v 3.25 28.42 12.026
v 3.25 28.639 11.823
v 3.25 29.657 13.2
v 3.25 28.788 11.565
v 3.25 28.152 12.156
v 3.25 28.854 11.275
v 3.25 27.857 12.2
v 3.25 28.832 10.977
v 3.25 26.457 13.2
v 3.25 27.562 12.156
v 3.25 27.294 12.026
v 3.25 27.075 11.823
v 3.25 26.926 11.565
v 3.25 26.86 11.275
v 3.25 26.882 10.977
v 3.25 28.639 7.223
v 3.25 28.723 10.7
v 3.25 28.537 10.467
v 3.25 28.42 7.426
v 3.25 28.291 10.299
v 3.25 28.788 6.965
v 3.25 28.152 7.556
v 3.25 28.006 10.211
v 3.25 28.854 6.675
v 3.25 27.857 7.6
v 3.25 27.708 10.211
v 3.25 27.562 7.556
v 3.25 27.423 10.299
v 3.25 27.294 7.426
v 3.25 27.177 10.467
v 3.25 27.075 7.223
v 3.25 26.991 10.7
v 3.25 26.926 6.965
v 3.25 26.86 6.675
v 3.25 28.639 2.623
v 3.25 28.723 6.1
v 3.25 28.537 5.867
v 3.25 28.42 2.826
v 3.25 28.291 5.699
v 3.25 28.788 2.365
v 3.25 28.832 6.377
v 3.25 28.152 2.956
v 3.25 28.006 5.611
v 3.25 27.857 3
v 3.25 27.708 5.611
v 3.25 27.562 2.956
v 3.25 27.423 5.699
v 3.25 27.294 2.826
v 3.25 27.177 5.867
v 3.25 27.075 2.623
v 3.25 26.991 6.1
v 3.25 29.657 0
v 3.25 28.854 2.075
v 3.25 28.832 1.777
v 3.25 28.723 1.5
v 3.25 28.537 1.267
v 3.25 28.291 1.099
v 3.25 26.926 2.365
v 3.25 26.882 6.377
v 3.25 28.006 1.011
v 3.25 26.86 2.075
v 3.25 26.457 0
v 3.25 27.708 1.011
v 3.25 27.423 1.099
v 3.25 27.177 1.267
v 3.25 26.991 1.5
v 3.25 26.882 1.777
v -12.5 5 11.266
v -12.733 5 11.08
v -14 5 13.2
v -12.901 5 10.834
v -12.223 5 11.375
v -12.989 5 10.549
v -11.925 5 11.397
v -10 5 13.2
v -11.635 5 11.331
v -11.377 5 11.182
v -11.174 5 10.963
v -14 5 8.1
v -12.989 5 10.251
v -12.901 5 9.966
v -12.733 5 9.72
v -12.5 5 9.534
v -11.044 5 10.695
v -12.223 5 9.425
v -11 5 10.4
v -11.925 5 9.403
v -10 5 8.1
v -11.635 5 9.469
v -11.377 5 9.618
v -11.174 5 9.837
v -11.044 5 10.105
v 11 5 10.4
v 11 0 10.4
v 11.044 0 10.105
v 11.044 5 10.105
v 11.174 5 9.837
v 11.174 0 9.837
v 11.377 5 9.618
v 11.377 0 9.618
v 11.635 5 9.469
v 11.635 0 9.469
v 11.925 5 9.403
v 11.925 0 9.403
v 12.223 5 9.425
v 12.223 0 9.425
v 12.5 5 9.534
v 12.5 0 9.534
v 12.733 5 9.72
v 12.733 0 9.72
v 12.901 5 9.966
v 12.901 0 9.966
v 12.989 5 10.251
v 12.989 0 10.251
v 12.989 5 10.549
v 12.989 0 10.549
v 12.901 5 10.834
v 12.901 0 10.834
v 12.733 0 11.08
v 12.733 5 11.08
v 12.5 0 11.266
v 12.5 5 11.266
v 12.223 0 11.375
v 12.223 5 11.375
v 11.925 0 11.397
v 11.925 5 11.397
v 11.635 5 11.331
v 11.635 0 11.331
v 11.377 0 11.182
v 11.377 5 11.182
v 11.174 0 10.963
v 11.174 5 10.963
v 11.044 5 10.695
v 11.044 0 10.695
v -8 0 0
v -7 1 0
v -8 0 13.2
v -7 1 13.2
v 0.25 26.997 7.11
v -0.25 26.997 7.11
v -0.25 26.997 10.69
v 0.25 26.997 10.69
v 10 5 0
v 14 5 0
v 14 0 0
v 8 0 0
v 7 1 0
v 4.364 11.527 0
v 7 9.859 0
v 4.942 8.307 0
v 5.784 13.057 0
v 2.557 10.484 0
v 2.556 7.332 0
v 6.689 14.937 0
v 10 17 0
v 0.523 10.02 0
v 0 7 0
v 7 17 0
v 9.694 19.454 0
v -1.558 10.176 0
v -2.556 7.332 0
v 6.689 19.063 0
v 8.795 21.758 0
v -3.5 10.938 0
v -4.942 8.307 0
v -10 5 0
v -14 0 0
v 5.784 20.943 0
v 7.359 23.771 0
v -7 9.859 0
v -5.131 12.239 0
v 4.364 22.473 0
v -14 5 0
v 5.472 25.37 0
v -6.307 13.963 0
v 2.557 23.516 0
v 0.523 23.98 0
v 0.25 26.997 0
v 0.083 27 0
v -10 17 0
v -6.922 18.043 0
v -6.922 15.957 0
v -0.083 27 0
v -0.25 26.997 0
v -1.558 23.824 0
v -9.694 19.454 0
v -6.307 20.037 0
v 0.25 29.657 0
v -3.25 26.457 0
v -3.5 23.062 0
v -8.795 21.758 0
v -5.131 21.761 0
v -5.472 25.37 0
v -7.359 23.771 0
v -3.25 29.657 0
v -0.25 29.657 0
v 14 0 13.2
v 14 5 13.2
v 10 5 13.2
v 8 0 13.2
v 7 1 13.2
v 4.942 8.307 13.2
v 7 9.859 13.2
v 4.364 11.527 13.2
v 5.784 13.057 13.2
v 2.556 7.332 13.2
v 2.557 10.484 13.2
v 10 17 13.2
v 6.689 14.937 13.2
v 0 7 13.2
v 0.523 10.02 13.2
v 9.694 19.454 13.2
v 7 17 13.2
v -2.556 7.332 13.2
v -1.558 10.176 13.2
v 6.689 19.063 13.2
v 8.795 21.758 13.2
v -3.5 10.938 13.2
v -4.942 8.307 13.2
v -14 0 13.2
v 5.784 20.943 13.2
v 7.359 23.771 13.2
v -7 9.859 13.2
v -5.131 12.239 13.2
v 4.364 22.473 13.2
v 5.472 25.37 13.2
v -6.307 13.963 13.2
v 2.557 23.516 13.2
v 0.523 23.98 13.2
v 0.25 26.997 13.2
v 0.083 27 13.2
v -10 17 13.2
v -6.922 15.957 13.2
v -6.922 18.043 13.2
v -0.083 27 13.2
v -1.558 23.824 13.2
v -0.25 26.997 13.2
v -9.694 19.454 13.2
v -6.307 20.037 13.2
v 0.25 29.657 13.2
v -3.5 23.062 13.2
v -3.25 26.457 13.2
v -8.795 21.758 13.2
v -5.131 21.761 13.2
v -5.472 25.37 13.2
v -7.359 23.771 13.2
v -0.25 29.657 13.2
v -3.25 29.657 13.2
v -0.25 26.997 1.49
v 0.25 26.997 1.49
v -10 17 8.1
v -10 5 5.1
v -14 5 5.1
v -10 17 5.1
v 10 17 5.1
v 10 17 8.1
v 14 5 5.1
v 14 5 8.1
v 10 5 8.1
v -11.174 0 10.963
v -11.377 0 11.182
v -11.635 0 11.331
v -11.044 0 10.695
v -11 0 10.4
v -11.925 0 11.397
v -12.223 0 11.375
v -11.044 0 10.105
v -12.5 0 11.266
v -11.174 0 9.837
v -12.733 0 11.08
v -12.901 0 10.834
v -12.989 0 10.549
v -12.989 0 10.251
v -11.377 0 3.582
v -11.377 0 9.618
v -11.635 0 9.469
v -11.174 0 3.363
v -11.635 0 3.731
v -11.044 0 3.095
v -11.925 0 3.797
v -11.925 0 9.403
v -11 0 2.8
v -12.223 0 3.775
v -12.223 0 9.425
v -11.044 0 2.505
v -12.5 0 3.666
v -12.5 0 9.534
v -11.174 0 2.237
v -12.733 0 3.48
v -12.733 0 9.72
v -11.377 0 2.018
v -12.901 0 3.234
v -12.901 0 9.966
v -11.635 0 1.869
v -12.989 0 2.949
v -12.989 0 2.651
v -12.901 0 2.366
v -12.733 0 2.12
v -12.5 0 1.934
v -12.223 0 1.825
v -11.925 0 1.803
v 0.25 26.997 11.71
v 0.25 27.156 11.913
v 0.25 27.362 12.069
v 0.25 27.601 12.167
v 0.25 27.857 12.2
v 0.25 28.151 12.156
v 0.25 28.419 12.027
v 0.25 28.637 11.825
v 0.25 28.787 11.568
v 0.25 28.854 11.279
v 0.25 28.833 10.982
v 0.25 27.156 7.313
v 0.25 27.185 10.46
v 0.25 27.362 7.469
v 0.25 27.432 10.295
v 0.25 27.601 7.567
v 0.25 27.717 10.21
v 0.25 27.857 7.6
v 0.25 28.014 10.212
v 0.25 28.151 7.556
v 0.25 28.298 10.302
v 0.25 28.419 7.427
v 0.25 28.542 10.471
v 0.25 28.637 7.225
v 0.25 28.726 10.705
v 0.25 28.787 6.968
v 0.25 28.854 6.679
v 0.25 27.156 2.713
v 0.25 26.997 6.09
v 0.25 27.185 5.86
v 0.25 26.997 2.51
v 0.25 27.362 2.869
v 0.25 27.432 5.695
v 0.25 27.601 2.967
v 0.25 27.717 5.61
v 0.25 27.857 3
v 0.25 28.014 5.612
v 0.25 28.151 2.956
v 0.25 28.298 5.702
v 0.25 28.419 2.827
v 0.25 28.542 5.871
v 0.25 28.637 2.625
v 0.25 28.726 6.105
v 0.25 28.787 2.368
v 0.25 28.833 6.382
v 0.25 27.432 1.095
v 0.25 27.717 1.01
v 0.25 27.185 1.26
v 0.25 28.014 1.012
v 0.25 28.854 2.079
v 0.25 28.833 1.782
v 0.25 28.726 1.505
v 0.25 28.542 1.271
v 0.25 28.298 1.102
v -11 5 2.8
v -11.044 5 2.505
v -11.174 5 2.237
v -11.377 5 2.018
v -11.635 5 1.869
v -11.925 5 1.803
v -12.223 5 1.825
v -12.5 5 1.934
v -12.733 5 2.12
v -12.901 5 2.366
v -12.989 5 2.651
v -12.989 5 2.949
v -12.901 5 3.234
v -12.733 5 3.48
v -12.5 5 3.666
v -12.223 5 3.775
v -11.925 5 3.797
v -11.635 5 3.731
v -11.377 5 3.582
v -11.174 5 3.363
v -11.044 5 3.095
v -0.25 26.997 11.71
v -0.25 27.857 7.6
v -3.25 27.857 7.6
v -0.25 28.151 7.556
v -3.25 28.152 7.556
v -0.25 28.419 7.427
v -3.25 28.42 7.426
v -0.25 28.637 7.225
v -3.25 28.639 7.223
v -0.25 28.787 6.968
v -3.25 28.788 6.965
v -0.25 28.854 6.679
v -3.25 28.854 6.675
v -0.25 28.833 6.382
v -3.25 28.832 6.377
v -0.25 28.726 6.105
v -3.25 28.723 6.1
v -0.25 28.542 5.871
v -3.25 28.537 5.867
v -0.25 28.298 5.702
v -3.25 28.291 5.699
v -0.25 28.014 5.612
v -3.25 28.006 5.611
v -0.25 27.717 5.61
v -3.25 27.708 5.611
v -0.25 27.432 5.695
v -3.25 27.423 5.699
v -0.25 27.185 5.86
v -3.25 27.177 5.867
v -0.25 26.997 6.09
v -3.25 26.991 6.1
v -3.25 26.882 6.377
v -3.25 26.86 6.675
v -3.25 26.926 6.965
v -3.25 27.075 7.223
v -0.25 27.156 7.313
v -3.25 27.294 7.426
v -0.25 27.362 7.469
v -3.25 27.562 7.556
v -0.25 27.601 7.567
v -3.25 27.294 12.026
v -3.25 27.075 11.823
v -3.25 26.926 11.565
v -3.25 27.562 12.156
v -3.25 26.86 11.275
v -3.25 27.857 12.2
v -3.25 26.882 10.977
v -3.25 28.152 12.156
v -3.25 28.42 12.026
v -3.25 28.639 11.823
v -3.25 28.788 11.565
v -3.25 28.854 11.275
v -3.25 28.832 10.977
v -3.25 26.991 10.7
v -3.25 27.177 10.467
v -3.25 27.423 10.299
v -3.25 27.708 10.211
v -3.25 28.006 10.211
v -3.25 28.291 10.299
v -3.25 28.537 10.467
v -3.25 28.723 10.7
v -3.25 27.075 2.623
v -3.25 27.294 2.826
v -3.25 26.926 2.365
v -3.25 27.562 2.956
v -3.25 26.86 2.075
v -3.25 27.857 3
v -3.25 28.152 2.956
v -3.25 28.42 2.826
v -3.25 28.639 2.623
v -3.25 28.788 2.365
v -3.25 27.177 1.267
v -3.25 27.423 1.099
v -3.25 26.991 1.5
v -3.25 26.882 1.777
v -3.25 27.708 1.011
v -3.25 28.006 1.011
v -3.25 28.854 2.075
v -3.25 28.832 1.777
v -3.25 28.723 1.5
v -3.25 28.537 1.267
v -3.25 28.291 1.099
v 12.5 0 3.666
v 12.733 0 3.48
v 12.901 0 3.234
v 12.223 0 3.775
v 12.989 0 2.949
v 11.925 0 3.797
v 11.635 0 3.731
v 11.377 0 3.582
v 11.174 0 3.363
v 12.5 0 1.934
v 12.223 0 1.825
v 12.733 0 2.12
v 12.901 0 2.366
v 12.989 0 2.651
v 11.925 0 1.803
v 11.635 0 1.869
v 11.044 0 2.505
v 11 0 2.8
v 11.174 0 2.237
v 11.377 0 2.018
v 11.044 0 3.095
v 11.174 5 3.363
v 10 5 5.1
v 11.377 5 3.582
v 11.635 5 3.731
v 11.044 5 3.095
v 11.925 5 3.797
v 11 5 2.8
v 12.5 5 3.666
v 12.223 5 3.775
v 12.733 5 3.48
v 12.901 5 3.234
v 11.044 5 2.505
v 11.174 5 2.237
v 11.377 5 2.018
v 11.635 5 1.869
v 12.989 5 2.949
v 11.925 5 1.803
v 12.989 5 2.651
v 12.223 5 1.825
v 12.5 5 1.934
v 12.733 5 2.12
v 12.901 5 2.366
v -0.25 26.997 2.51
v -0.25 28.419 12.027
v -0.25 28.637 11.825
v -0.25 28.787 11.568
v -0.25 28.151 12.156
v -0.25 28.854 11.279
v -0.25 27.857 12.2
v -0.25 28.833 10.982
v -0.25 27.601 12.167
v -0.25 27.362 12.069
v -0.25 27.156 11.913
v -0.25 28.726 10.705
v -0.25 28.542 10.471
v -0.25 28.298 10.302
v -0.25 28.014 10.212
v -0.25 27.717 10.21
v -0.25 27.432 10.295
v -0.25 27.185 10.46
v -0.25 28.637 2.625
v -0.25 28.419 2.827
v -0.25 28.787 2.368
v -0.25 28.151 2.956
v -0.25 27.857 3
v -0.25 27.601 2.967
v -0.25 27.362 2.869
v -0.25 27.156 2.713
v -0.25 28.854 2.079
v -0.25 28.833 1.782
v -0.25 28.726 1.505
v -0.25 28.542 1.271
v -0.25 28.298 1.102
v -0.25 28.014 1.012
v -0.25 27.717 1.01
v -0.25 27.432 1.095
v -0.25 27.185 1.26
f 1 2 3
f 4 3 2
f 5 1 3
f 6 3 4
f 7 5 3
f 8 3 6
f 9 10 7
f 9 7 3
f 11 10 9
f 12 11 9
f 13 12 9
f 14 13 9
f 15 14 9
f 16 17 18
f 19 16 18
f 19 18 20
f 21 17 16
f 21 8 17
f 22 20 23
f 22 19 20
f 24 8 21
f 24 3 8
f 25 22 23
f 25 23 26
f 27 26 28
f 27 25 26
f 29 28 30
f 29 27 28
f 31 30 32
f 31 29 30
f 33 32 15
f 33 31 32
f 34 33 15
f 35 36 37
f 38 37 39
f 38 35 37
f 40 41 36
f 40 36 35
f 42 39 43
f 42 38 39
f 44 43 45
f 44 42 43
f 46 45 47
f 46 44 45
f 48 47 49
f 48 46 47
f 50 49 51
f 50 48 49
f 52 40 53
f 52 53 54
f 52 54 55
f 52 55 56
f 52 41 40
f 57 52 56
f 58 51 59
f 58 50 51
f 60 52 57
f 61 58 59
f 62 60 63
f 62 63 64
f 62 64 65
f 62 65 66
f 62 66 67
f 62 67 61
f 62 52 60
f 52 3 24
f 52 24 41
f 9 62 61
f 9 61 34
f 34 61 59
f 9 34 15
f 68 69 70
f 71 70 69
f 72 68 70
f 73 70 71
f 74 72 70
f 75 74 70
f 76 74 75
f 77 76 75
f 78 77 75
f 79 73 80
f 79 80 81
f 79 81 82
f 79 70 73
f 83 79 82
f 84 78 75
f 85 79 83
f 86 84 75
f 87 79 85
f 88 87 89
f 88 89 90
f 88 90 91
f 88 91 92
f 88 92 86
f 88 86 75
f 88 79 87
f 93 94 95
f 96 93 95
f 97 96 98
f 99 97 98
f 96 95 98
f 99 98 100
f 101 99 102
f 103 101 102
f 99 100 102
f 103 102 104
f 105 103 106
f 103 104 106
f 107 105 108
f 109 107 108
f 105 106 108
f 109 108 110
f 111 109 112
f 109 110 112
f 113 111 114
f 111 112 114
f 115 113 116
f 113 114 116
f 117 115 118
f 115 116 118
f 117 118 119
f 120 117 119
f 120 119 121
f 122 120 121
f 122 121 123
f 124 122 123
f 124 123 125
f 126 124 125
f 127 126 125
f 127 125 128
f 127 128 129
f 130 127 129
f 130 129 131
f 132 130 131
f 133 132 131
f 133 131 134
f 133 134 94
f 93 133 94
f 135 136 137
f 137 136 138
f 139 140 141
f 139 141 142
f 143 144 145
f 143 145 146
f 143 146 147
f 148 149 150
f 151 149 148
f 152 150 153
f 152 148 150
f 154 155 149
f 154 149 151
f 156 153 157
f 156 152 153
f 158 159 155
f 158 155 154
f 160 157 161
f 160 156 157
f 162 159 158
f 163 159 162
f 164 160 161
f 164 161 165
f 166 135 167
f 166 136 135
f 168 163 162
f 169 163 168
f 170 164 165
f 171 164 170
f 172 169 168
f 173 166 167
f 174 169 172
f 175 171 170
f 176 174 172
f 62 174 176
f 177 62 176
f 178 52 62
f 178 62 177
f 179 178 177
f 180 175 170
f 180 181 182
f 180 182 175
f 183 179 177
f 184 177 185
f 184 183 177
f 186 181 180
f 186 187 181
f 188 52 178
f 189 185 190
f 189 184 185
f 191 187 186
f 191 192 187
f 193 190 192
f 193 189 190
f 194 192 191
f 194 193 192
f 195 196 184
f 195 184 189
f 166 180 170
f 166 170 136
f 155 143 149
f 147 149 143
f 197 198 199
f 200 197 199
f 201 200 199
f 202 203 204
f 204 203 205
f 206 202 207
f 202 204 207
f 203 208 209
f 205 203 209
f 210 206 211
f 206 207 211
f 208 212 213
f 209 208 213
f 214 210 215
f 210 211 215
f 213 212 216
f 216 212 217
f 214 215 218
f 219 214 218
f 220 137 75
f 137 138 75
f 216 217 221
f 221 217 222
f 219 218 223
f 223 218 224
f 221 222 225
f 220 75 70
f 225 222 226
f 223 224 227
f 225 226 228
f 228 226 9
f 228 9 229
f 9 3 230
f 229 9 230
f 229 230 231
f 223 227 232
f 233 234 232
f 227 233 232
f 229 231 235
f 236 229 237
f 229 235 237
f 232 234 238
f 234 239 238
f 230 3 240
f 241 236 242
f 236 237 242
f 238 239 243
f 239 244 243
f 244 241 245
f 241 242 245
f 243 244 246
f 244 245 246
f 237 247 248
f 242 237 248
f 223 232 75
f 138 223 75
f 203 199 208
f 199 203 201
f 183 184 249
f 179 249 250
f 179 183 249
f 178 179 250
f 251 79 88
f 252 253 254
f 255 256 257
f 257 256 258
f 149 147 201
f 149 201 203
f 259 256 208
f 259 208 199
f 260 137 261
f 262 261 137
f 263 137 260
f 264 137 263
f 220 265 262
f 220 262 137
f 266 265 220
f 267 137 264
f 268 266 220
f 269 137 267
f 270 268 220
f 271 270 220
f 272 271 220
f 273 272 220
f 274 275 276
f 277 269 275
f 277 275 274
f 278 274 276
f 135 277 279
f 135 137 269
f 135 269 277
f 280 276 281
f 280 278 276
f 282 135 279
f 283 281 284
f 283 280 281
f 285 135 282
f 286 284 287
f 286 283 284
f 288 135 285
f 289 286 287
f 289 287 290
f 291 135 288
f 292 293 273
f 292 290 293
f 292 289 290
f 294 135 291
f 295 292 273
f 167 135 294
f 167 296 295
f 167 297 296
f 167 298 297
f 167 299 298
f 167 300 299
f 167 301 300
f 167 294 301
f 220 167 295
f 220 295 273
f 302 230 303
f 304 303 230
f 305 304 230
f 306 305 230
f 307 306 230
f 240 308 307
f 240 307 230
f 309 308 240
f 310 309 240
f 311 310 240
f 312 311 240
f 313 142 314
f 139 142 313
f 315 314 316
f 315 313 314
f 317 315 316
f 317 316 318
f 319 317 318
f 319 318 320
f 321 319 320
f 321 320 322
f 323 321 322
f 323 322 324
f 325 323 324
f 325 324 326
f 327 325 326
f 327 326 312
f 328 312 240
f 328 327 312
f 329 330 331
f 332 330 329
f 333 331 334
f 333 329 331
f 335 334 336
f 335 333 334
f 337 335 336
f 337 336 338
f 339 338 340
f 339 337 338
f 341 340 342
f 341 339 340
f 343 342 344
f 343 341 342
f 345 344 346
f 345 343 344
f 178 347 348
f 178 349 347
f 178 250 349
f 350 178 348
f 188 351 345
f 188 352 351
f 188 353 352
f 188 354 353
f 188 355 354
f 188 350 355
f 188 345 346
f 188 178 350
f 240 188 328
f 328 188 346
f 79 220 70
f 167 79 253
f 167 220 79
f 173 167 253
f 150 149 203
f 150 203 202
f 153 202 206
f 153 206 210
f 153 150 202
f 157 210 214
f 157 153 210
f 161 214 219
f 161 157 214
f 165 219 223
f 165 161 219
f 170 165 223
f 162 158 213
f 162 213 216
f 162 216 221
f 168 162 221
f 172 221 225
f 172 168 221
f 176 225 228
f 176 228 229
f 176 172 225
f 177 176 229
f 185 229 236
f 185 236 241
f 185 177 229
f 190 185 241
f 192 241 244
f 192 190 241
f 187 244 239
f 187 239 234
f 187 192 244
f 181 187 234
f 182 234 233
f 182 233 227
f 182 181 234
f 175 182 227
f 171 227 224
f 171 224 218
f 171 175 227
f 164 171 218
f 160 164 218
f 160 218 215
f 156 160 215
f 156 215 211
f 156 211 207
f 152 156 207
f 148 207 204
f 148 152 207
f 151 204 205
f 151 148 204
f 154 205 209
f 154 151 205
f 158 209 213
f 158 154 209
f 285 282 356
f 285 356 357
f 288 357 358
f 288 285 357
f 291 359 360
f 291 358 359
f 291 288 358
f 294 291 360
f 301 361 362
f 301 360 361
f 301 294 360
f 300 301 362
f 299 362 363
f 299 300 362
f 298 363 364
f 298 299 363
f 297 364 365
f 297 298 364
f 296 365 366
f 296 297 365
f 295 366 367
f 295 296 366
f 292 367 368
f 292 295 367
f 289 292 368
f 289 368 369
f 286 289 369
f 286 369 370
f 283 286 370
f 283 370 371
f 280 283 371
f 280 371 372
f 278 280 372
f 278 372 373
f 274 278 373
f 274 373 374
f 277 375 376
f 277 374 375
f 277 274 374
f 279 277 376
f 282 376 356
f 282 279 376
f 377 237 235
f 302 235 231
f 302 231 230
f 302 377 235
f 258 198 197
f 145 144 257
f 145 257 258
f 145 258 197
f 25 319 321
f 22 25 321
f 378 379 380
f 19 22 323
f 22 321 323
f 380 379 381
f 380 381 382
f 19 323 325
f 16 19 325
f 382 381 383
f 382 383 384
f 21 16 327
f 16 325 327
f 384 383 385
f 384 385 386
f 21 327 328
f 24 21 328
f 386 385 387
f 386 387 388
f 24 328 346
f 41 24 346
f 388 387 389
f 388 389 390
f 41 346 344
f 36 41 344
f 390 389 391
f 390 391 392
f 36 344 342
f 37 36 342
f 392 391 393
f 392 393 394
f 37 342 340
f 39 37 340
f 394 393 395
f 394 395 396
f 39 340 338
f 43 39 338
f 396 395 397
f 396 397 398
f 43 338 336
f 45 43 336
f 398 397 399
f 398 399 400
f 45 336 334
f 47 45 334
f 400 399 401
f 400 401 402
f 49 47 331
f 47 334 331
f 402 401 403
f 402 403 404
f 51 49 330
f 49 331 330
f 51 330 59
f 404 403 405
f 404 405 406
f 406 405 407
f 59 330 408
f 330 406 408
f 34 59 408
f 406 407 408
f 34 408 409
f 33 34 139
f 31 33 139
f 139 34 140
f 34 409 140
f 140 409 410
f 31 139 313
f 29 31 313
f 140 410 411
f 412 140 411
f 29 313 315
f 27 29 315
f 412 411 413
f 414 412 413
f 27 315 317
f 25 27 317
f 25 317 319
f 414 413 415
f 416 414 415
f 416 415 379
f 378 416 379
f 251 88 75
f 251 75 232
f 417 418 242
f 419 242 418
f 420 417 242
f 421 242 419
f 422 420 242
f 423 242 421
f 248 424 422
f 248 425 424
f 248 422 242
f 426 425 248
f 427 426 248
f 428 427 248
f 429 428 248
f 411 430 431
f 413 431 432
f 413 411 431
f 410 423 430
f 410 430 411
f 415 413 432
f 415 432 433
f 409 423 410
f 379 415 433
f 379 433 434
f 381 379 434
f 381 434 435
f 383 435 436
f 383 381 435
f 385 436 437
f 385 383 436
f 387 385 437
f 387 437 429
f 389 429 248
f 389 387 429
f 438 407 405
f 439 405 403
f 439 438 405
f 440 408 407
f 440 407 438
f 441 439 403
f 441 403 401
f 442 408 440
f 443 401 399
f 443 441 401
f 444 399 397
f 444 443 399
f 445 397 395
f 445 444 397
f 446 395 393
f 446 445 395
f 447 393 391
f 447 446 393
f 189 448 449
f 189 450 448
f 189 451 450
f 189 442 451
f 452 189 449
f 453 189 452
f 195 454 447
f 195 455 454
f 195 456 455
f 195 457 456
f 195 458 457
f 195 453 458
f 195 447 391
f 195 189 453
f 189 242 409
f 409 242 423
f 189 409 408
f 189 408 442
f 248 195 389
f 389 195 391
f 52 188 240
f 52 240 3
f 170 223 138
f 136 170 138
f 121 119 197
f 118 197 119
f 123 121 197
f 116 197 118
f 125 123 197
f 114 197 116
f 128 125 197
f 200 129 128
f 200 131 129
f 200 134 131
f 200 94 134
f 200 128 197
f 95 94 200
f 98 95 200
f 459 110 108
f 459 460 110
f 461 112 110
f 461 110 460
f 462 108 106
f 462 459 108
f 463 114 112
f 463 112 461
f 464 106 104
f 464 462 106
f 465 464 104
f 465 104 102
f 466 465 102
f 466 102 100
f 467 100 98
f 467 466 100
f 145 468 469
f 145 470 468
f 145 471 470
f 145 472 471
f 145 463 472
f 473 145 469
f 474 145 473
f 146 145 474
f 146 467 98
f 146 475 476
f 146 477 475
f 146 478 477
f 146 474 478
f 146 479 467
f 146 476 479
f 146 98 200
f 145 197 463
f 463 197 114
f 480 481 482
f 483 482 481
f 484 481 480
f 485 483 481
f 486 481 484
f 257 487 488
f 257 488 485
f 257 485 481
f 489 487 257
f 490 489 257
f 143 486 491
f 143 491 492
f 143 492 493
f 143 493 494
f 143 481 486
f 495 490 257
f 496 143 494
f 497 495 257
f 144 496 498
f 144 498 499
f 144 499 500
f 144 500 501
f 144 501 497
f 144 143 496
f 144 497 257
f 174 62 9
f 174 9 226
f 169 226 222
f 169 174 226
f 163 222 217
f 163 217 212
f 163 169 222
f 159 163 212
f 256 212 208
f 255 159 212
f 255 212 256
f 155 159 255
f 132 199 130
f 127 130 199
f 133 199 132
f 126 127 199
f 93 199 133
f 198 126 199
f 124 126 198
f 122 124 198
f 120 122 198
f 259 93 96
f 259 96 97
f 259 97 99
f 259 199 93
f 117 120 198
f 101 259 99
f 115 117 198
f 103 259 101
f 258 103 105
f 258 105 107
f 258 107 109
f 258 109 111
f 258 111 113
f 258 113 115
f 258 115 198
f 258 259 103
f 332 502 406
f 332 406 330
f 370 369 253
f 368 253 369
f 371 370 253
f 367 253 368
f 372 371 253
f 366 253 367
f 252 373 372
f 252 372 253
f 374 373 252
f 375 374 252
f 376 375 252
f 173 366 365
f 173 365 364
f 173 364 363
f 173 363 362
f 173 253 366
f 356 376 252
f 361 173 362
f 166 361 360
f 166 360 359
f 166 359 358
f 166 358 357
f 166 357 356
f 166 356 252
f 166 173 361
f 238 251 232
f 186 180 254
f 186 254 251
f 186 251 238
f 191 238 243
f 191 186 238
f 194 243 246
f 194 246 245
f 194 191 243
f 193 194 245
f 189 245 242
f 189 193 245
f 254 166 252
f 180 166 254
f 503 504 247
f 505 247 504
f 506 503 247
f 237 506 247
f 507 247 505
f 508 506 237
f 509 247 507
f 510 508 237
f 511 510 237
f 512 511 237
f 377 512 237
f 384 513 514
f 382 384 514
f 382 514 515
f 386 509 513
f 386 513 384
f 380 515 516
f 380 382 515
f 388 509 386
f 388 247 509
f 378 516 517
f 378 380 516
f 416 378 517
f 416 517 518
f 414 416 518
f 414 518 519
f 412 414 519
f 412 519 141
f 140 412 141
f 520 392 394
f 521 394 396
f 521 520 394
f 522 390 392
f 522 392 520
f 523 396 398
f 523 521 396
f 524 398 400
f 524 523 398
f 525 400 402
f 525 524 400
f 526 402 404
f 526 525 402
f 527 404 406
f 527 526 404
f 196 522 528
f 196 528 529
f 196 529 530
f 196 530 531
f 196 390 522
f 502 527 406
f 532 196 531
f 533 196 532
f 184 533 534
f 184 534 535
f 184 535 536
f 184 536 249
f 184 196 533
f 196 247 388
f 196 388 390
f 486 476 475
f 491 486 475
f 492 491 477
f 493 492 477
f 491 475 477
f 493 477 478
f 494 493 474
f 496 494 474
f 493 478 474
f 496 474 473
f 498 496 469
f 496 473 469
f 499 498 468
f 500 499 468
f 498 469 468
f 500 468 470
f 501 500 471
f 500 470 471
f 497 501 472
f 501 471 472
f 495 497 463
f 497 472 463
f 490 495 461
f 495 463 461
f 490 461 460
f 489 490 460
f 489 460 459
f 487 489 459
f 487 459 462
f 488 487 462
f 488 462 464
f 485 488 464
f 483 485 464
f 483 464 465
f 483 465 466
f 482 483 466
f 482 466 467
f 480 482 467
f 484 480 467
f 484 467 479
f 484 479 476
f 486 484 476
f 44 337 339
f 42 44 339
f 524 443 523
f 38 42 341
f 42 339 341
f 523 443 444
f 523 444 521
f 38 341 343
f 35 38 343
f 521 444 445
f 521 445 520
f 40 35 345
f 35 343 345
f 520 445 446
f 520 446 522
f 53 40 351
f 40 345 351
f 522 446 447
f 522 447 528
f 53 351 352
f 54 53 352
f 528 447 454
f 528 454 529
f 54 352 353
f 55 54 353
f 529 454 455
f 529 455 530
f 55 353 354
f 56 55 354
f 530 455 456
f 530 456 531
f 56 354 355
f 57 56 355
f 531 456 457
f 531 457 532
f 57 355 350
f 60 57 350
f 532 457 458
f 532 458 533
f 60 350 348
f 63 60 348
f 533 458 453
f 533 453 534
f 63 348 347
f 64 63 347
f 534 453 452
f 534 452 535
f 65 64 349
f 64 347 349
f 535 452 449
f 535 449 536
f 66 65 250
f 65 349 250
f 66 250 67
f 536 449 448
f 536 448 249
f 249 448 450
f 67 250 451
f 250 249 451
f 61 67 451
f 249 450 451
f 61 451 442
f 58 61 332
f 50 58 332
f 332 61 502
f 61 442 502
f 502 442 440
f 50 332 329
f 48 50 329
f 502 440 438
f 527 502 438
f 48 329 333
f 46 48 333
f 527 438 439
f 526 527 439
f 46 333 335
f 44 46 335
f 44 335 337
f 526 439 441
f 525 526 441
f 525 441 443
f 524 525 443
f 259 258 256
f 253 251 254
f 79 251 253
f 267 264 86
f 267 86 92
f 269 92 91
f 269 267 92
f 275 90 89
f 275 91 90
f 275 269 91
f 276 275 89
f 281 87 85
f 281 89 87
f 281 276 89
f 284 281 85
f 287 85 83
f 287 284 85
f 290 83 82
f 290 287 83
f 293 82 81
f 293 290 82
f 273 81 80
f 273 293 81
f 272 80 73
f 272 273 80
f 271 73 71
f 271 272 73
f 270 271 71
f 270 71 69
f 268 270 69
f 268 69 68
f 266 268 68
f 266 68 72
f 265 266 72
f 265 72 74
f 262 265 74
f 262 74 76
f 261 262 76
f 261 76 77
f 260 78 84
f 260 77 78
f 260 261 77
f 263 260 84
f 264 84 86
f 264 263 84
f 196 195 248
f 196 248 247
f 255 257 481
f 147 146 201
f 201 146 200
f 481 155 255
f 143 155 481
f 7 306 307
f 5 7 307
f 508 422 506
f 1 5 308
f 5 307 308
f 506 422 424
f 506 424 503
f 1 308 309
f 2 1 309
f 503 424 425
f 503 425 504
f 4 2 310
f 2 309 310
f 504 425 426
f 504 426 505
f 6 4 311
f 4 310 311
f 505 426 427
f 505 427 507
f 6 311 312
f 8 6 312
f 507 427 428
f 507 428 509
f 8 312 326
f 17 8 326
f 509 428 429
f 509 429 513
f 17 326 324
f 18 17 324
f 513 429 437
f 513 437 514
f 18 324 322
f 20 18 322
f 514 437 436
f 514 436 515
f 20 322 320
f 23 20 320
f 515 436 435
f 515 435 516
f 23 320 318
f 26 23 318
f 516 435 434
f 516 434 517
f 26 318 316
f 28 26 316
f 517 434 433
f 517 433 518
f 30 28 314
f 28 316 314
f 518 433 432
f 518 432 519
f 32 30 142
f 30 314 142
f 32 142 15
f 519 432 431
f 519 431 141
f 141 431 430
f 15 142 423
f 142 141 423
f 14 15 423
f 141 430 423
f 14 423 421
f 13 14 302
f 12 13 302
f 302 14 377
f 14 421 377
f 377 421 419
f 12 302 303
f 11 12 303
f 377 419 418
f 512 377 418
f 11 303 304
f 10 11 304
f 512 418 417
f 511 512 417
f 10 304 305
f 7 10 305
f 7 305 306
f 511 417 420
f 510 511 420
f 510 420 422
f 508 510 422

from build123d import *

# Parameters (mm, degrees)
SKETCH1_R           = 7
BOSS_EXTRUDE1_DEPTH = 13.2
HOLE1_D             = 2
HOLE1_DEPTH         = 30
HOLE2_D             = 2
HOLE2_DEPTH         = 30
BOSS_EXTRUDE2_DEPTH = 1.5
CHAMFER1_SIZE       = 1


with BuildPart() as part:
    # Sketch1 → Boss-Extrude1 (new body)
    with BuildSketch(Plane.XY):
        with BuildLine():
            Line((-14, 0), (-14, 5))
            Line((-14, 5), (-10, 5))
            Line((-10, 5), (-10, 17))
            ThreePointArc((-10, 17), (-8.139410298, 22.809475019), (-3.25, 26.45714016))
            Line((-3.25, 26.45714016), (-3.25, 29.65714016))
            Line((-3.25, 29.65714016), (-0.25, 29.65714016))
            Line((-0.25, 29.65714016), (-0.25, 26.996874512))
            ThreePointArc((-0.25, 26.996874512), (0, 27), (0.25, 26.996874512))
            Line((0.25, 26.996874512), (0.25, 29.65714016))
            Line((0.25, 29.65714016), (3.25, 29.65714016))
            Line((3.25, 29.65714016), (3.25, 26.45714016))
            ThreePointArc((3.25, 26.45714016), (8.139410298, 22.809475019), (10, 17))
            Line((10, 17), (10, 5))
            Line((10, 5), (14, 5))
            Line((14, 5), (14, 0))
            Line((14, 0), (7, 0))
            Line((7, 0), (7, 9.858571571))
            ThreePointArc((7, 9.858571571), (0, 7), (-7, 9.858571571))
            Line((-7, 9.858571571), (-7, 0))
            Line((-7, 0), (-14, 0))
        make_face()
        with Locations((0, 17)):
            Circle(SKETCH1_R, mode=Mode.SUBTRACT)
    extrude(amount=BOSS_EXTRUDE1_DEPTH)

    # Hole1
    with Locations(Plane(origin=(3.25, 0, 0), x_dir=(0, 0, -1), z_dir=(1, 0, 0))):
        with Locations((-11.2, 27.85714016), (-2, 27.85714016), (-6.6, 27.85714016)):
            Hole(HOLE1_D / 2, depth=HOLE1_DEPTH)

    # Hole2
    with Locations(Plane(origin=(0, 5, 0), x_dir=(1, 0, 0), z_dir=(0, 1, 0))):
        with Locations((12, -2.8), (12, -10.4)):
            hole2 = Hole(HOLE2_D / 2, depth=HOLE2_DEPTH)

    # Mirror1: Hole2 across plane
    add(hole2.mirror(Plane(origin=(0, 0, 0), x_dir=(0, 0, 1), z_dir=(1, 0, 0))), mode=Mode.SUBTRACT)

    # Sketch6 → Boss-Extrude2 (add, symmetric)
    with BuildSketch(Plane.XY.offset(6.6)):
        Polygon((10, 17), (14, 5), (10, 5), align=None)
    boss_extrude2 = extrude(amount=BOSS_EXTRUDE2_DEPTH, both=True)

    # Mirror2: Boss-Extrude2 across plane
    add(boss_extrude2.mirror(Plane(origin=(0, 0, 0), x_dir=(0, 0, 1), z_dir=(1, 0, 0))))

    # Chamfer1
    chamfer1_edges = [part.edges().sort_by_distance(p)[0] for p in [
        (7, 0, 6.6),
        (-7, 0, 6.6),
    ]]
    chamfer(chamfer1_edges, length=CHAMFER1_SIZE)


solid = part.part
